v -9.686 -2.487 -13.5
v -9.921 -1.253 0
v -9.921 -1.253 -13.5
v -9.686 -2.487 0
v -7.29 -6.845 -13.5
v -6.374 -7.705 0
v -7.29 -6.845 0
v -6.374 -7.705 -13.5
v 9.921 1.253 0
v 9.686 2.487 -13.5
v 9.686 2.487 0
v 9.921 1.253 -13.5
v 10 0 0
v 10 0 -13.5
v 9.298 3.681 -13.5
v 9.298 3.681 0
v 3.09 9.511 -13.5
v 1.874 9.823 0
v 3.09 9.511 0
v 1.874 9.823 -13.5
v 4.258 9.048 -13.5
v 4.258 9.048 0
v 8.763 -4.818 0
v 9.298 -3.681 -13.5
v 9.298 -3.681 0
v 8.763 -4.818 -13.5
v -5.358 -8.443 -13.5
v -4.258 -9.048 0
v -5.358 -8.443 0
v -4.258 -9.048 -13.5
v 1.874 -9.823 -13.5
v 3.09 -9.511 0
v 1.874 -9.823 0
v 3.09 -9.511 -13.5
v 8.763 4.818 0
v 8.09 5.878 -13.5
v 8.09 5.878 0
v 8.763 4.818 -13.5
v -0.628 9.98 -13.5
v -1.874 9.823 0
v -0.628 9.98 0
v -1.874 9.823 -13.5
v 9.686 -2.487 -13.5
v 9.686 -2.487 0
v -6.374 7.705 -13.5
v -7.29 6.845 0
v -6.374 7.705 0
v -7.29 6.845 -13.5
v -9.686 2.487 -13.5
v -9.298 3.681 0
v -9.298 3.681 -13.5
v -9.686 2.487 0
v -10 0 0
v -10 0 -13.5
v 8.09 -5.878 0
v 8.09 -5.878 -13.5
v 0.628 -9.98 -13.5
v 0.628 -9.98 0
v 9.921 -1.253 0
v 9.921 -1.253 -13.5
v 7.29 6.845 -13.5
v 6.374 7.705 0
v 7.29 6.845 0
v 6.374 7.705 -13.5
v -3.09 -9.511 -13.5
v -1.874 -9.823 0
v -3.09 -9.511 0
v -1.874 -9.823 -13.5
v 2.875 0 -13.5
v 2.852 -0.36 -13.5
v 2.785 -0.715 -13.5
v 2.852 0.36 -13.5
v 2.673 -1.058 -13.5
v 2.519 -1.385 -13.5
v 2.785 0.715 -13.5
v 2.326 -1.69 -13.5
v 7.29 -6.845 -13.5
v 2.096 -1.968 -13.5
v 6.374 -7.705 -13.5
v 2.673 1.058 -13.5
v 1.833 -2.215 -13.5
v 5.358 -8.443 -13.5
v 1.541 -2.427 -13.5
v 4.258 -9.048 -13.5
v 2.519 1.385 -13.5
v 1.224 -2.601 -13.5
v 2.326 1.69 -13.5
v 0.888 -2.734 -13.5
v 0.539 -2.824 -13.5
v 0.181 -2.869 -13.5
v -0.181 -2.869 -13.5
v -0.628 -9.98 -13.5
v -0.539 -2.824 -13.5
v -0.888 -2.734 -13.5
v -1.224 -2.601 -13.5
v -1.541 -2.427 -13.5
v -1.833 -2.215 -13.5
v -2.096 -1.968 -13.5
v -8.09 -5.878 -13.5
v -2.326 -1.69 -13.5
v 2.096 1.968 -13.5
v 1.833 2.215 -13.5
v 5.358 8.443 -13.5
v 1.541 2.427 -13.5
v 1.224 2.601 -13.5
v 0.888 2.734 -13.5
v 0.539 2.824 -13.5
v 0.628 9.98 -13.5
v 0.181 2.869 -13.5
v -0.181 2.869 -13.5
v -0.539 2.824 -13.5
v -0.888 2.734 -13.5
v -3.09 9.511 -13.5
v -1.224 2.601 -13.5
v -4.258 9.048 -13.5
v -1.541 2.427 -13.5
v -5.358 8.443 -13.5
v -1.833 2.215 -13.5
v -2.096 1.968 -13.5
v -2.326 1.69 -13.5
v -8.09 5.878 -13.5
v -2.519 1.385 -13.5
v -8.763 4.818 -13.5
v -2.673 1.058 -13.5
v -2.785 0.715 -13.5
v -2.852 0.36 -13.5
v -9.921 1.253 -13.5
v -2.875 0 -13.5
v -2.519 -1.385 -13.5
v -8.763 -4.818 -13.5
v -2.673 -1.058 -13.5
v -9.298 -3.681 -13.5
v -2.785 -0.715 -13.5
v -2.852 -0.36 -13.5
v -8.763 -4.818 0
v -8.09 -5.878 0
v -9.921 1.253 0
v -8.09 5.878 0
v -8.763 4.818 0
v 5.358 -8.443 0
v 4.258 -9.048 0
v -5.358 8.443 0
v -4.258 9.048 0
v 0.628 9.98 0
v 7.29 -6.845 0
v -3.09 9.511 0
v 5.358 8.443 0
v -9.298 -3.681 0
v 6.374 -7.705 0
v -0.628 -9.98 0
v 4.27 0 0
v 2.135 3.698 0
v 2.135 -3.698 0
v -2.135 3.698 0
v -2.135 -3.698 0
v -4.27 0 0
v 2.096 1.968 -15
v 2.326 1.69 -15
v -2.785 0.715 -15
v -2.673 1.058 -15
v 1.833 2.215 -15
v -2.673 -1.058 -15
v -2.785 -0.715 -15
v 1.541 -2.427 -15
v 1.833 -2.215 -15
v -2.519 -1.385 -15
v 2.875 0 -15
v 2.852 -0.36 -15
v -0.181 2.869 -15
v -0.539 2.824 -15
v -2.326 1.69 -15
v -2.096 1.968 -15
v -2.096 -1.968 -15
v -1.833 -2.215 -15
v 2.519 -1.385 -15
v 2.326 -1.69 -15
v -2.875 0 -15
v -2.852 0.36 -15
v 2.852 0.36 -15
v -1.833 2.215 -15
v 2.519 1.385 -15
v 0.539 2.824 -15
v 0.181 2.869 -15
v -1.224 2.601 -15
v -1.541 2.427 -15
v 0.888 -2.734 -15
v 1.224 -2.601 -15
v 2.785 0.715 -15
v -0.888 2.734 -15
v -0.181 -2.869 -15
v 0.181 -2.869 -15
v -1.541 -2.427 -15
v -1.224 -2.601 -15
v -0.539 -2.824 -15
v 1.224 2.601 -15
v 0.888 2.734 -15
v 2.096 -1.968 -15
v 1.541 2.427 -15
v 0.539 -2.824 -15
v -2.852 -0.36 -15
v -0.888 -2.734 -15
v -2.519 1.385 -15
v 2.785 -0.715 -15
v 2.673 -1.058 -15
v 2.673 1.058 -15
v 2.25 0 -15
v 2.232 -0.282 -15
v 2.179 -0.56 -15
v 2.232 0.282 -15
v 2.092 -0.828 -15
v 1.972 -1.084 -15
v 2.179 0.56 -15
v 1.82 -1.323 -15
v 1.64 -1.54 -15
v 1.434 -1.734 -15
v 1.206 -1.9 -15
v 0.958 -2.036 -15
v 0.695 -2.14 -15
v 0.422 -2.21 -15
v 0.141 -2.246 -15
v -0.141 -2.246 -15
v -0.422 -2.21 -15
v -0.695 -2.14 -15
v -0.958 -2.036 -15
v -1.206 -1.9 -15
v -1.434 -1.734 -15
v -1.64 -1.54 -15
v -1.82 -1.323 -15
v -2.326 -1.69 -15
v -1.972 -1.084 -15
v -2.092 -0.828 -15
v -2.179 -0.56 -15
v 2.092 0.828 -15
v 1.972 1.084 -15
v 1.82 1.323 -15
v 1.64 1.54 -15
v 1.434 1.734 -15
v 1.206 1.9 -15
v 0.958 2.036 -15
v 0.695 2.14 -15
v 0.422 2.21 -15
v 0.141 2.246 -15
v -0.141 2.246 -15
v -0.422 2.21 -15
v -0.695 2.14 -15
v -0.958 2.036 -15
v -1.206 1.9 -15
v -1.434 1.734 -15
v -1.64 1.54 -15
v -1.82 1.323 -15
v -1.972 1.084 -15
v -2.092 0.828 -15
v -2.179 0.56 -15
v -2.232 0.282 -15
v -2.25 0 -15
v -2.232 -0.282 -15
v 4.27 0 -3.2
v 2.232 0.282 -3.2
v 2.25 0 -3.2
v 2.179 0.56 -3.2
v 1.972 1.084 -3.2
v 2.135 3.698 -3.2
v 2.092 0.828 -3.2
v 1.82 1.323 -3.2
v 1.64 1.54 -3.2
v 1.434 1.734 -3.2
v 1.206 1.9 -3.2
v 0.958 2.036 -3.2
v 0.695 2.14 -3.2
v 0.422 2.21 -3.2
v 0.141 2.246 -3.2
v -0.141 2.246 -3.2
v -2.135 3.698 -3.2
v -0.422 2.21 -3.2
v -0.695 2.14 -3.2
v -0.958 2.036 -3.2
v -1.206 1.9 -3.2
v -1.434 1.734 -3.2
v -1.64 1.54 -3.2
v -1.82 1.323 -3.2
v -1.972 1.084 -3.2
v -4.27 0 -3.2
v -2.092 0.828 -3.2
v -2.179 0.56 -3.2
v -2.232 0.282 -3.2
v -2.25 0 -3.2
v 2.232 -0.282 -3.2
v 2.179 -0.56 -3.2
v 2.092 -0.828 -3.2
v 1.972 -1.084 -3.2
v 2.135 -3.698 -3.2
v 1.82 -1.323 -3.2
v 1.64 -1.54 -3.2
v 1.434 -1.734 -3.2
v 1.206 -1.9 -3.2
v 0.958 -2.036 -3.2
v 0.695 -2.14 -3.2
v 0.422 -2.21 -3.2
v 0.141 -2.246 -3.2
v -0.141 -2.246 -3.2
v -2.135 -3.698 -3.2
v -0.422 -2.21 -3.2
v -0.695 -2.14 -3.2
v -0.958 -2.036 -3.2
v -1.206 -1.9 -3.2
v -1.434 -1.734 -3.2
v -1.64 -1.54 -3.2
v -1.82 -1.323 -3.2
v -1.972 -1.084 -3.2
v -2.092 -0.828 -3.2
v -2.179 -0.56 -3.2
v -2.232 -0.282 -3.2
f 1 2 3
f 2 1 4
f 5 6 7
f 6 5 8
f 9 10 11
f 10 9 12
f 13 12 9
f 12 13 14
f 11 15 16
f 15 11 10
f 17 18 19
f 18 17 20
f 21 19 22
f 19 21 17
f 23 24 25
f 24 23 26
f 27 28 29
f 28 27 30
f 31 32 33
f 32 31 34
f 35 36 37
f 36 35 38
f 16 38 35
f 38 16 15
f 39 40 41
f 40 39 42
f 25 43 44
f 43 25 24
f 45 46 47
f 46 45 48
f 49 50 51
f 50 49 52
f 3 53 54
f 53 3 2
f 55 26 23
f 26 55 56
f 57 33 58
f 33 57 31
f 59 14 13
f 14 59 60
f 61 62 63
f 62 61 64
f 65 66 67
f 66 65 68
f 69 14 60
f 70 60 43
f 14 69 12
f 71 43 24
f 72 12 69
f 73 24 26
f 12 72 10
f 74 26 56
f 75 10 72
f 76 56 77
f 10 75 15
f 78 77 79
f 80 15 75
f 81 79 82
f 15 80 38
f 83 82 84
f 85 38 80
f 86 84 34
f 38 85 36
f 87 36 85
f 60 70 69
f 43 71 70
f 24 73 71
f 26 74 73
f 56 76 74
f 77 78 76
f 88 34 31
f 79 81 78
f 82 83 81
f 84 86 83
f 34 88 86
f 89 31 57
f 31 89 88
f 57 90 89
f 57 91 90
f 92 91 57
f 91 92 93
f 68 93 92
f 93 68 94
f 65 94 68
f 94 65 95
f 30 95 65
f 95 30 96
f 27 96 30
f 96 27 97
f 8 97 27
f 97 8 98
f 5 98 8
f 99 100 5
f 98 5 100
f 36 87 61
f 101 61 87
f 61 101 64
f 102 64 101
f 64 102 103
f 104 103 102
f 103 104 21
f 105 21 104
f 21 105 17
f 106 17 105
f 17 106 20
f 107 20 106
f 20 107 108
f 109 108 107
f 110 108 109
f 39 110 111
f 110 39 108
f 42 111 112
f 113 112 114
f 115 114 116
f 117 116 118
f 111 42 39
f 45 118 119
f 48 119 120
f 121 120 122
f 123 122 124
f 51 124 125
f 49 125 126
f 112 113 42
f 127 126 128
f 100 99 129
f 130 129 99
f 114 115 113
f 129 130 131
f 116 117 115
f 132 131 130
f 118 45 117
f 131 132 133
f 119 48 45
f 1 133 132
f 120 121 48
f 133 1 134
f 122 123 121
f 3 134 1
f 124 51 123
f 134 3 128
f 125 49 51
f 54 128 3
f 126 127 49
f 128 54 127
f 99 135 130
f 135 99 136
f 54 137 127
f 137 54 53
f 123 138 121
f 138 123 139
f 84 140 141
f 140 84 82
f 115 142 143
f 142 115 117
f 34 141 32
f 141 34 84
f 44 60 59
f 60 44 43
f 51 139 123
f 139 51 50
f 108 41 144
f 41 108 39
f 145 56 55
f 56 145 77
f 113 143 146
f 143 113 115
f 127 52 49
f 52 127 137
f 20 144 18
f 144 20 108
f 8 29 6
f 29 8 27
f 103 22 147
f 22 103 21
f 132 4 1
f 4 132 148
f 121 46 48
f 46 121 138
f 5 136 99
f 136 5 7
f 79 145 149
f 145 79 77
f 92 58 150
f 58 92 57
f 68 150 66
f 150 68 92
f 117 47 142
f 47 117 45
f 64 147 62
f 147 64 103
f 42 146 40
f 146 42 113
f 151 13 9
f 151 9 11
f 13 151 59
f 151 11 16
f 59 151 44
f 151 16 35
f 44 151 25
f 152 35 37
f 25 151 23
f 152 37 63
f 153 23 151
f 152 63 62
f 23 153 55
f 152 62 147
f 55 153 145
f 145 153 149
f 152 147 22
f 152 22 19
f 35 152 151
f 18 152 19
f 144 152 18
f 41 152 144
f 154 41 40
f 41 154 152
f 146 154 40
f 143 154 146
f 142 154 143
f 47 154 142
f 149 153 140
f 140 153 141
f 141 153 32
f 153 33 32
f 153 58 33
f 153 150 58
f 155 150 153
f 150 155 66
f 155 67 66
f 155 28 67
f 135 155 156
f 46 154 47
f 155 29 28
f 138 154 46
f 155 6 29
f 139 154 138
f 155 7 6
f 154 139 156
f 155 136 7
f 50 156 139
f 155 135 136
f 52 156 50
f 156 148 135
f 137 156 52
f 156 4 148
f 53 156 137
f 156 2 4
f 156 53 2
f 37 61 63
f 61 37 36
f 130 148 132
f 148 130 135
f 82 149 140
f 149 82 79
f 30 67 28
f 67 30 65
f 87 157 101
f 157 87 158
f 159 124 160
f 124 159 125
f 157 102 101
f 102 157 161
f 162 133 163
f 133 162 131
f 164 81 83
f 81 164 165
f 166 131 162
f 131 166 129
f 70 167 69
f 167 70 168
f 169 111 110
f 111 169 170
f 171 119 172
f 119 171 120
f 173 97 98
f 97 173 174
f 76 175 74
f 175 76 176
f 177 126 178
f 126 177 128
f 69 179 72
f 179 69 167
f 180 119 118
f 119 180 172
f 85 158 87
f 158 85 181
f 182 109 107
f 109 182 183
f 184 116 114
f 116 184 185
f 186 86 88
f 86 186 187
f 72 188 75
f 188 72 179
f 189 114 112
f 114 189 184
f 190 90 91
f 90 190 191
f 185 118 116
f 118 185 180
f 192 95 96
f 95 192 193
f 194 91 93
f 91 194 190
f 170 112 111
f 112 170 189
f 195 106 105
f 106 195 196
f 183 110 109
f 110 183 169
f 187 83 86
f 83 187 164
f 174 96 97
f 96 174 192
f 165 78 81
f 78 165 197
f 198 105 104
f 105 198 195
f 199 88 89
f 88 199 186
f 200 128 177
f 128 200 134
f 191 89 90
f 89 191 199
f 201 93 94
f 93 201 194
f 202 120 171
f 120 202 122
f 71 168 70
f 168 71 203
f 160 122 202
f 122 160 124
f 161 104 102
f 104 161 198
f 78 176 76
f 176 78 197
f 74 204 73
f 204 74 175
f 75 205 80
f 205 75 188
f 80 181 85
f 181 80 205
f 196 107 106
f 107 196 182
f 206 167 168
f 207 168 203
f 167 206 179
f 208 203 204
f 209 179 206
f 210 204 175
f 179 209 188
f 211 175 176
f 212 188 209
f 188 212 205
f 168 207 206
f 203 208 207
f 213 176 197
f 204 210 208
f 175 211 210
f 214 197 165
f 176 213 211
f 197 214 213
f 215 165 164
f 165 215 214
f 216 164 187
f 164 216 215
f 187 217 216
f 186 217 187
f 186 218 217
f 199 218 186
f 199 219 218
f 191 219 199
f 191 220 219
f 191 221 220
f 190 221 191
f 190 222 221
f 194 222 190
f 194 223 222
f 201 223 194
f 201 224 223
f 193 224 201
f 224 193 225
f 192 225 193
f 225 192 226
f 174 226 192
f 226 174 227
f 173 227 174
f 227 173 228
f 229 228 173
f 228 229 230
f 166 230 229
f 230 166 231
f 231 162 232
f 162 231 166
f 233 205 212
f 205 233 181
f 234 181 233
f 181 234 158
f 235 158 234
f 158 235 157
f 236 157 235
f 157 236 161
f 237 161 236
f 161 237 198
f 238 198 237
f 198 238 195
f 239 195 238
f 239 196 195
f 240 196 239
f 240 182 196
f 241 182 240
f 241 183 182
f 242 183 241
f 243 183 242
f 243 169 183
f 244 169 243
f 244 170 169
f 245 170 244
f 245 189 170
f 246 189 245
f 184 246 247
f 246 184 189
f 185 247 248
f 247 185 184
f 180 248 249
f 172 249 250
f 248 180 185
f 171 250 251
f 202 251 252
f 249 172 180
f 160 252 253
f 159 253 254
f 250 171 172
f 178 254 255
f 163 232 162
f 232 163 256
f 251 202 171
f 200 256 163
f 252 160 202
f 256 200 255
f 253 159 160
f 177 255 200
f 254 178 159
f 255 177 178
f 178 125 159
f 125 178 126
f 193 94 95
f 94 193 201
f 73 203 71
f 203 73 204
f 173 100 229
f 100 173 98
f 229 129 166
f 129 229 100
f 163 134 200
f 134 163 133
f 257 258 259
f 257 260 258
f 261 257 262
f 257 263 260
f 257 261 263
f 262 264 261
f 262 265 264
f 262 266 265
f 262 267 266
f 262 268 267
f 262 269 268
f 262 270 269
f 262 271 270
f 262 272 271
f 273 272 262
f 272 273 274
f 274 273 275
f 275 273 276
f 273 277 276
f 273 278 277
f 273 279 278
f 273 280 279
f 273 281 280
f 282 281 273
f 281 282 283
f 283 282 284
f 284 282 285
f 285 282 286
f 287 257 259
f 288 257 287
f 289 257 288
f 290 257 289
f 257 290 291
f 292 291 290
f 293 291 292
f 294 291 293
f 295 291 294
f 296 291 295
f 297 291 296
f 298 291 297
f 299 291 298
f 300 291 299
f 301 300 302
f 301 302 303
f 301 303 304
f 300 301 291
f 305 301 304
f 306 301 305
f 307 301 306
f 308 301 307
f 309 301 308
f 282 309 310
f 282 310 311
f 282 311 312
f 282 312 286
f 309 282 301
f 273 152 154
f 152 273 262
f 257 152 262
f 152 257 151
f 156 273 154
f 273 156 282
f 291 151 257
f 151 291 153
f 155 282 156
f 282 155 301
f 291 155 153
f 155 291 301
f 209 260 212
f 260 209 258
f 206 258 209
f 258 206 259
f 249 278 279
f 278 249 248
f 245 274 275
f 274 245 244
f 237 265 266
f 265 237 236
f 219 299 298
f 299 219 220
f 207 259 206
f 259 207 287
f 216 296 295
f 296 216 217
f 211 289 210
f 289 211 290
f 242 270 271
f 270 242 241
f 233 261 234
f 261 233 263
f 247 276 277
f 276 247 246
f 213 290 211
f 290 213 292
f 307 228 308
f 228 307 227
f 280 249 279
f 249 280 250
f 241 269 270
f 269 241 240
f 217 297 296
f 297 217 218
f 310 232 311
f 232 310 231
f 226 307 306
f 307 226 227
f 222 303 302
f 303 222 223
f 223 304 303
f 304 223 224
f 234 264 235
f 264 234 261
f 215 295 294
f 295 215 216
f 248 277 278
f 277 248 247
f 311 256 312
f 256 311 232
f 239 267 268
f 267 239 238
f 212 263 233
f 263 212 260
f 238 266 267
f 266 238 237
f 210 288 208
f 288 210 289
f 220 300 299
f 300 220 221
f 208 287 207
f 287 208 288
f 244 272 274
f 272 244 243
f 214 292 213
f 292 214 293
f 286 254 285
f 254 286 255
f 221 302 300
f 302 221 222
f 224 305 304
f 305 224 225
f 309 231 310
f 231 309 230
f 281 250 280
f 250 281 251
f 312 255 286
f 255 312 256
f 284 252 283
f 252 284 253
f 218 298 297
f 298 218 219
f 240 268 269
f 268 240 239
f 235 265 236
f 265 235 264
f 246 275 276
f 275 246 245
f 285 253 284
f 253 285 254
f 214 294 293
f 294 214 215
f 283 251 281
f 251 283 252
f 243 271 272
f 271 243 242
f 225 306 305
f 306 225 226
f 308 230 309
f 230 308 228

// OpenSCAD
$fn = 50;

difference() {
	union() {
		translate(v = [0, 0, -13.5]) {
			cylinder(h = 13.5, r = 10.0);
		}
		#translate(v = [0, 0, -15.0]) {
			cylinder(h = 15, r = 2.875);
		}
	}
	union() {
		translate(v = [0, 0, 0]) {
			rotate(a = [0, 0, 0]) {
				difference() {
					union() {
						translate(v = [0, 0, -3.2]) {
							linear_extrude(height = 3.2) {
								polygon(points = [[4.2698, 0.0], [2.1349000000000005, 3.697755269078796], [-2.134899999999999, 3.6977552690787965], [-4.2698, 5.228996902999369e-16], [-2.134900000000002, -3.6977552690787956], [2.1348999999999974, -3.697755269078798]]);
							}
						}
					}
					union();
				}
			}
		}
		#translate(v = [0, 0, -100.0]) {
			cylinder(h = 200, r = 2.25);
		}
	}
}
